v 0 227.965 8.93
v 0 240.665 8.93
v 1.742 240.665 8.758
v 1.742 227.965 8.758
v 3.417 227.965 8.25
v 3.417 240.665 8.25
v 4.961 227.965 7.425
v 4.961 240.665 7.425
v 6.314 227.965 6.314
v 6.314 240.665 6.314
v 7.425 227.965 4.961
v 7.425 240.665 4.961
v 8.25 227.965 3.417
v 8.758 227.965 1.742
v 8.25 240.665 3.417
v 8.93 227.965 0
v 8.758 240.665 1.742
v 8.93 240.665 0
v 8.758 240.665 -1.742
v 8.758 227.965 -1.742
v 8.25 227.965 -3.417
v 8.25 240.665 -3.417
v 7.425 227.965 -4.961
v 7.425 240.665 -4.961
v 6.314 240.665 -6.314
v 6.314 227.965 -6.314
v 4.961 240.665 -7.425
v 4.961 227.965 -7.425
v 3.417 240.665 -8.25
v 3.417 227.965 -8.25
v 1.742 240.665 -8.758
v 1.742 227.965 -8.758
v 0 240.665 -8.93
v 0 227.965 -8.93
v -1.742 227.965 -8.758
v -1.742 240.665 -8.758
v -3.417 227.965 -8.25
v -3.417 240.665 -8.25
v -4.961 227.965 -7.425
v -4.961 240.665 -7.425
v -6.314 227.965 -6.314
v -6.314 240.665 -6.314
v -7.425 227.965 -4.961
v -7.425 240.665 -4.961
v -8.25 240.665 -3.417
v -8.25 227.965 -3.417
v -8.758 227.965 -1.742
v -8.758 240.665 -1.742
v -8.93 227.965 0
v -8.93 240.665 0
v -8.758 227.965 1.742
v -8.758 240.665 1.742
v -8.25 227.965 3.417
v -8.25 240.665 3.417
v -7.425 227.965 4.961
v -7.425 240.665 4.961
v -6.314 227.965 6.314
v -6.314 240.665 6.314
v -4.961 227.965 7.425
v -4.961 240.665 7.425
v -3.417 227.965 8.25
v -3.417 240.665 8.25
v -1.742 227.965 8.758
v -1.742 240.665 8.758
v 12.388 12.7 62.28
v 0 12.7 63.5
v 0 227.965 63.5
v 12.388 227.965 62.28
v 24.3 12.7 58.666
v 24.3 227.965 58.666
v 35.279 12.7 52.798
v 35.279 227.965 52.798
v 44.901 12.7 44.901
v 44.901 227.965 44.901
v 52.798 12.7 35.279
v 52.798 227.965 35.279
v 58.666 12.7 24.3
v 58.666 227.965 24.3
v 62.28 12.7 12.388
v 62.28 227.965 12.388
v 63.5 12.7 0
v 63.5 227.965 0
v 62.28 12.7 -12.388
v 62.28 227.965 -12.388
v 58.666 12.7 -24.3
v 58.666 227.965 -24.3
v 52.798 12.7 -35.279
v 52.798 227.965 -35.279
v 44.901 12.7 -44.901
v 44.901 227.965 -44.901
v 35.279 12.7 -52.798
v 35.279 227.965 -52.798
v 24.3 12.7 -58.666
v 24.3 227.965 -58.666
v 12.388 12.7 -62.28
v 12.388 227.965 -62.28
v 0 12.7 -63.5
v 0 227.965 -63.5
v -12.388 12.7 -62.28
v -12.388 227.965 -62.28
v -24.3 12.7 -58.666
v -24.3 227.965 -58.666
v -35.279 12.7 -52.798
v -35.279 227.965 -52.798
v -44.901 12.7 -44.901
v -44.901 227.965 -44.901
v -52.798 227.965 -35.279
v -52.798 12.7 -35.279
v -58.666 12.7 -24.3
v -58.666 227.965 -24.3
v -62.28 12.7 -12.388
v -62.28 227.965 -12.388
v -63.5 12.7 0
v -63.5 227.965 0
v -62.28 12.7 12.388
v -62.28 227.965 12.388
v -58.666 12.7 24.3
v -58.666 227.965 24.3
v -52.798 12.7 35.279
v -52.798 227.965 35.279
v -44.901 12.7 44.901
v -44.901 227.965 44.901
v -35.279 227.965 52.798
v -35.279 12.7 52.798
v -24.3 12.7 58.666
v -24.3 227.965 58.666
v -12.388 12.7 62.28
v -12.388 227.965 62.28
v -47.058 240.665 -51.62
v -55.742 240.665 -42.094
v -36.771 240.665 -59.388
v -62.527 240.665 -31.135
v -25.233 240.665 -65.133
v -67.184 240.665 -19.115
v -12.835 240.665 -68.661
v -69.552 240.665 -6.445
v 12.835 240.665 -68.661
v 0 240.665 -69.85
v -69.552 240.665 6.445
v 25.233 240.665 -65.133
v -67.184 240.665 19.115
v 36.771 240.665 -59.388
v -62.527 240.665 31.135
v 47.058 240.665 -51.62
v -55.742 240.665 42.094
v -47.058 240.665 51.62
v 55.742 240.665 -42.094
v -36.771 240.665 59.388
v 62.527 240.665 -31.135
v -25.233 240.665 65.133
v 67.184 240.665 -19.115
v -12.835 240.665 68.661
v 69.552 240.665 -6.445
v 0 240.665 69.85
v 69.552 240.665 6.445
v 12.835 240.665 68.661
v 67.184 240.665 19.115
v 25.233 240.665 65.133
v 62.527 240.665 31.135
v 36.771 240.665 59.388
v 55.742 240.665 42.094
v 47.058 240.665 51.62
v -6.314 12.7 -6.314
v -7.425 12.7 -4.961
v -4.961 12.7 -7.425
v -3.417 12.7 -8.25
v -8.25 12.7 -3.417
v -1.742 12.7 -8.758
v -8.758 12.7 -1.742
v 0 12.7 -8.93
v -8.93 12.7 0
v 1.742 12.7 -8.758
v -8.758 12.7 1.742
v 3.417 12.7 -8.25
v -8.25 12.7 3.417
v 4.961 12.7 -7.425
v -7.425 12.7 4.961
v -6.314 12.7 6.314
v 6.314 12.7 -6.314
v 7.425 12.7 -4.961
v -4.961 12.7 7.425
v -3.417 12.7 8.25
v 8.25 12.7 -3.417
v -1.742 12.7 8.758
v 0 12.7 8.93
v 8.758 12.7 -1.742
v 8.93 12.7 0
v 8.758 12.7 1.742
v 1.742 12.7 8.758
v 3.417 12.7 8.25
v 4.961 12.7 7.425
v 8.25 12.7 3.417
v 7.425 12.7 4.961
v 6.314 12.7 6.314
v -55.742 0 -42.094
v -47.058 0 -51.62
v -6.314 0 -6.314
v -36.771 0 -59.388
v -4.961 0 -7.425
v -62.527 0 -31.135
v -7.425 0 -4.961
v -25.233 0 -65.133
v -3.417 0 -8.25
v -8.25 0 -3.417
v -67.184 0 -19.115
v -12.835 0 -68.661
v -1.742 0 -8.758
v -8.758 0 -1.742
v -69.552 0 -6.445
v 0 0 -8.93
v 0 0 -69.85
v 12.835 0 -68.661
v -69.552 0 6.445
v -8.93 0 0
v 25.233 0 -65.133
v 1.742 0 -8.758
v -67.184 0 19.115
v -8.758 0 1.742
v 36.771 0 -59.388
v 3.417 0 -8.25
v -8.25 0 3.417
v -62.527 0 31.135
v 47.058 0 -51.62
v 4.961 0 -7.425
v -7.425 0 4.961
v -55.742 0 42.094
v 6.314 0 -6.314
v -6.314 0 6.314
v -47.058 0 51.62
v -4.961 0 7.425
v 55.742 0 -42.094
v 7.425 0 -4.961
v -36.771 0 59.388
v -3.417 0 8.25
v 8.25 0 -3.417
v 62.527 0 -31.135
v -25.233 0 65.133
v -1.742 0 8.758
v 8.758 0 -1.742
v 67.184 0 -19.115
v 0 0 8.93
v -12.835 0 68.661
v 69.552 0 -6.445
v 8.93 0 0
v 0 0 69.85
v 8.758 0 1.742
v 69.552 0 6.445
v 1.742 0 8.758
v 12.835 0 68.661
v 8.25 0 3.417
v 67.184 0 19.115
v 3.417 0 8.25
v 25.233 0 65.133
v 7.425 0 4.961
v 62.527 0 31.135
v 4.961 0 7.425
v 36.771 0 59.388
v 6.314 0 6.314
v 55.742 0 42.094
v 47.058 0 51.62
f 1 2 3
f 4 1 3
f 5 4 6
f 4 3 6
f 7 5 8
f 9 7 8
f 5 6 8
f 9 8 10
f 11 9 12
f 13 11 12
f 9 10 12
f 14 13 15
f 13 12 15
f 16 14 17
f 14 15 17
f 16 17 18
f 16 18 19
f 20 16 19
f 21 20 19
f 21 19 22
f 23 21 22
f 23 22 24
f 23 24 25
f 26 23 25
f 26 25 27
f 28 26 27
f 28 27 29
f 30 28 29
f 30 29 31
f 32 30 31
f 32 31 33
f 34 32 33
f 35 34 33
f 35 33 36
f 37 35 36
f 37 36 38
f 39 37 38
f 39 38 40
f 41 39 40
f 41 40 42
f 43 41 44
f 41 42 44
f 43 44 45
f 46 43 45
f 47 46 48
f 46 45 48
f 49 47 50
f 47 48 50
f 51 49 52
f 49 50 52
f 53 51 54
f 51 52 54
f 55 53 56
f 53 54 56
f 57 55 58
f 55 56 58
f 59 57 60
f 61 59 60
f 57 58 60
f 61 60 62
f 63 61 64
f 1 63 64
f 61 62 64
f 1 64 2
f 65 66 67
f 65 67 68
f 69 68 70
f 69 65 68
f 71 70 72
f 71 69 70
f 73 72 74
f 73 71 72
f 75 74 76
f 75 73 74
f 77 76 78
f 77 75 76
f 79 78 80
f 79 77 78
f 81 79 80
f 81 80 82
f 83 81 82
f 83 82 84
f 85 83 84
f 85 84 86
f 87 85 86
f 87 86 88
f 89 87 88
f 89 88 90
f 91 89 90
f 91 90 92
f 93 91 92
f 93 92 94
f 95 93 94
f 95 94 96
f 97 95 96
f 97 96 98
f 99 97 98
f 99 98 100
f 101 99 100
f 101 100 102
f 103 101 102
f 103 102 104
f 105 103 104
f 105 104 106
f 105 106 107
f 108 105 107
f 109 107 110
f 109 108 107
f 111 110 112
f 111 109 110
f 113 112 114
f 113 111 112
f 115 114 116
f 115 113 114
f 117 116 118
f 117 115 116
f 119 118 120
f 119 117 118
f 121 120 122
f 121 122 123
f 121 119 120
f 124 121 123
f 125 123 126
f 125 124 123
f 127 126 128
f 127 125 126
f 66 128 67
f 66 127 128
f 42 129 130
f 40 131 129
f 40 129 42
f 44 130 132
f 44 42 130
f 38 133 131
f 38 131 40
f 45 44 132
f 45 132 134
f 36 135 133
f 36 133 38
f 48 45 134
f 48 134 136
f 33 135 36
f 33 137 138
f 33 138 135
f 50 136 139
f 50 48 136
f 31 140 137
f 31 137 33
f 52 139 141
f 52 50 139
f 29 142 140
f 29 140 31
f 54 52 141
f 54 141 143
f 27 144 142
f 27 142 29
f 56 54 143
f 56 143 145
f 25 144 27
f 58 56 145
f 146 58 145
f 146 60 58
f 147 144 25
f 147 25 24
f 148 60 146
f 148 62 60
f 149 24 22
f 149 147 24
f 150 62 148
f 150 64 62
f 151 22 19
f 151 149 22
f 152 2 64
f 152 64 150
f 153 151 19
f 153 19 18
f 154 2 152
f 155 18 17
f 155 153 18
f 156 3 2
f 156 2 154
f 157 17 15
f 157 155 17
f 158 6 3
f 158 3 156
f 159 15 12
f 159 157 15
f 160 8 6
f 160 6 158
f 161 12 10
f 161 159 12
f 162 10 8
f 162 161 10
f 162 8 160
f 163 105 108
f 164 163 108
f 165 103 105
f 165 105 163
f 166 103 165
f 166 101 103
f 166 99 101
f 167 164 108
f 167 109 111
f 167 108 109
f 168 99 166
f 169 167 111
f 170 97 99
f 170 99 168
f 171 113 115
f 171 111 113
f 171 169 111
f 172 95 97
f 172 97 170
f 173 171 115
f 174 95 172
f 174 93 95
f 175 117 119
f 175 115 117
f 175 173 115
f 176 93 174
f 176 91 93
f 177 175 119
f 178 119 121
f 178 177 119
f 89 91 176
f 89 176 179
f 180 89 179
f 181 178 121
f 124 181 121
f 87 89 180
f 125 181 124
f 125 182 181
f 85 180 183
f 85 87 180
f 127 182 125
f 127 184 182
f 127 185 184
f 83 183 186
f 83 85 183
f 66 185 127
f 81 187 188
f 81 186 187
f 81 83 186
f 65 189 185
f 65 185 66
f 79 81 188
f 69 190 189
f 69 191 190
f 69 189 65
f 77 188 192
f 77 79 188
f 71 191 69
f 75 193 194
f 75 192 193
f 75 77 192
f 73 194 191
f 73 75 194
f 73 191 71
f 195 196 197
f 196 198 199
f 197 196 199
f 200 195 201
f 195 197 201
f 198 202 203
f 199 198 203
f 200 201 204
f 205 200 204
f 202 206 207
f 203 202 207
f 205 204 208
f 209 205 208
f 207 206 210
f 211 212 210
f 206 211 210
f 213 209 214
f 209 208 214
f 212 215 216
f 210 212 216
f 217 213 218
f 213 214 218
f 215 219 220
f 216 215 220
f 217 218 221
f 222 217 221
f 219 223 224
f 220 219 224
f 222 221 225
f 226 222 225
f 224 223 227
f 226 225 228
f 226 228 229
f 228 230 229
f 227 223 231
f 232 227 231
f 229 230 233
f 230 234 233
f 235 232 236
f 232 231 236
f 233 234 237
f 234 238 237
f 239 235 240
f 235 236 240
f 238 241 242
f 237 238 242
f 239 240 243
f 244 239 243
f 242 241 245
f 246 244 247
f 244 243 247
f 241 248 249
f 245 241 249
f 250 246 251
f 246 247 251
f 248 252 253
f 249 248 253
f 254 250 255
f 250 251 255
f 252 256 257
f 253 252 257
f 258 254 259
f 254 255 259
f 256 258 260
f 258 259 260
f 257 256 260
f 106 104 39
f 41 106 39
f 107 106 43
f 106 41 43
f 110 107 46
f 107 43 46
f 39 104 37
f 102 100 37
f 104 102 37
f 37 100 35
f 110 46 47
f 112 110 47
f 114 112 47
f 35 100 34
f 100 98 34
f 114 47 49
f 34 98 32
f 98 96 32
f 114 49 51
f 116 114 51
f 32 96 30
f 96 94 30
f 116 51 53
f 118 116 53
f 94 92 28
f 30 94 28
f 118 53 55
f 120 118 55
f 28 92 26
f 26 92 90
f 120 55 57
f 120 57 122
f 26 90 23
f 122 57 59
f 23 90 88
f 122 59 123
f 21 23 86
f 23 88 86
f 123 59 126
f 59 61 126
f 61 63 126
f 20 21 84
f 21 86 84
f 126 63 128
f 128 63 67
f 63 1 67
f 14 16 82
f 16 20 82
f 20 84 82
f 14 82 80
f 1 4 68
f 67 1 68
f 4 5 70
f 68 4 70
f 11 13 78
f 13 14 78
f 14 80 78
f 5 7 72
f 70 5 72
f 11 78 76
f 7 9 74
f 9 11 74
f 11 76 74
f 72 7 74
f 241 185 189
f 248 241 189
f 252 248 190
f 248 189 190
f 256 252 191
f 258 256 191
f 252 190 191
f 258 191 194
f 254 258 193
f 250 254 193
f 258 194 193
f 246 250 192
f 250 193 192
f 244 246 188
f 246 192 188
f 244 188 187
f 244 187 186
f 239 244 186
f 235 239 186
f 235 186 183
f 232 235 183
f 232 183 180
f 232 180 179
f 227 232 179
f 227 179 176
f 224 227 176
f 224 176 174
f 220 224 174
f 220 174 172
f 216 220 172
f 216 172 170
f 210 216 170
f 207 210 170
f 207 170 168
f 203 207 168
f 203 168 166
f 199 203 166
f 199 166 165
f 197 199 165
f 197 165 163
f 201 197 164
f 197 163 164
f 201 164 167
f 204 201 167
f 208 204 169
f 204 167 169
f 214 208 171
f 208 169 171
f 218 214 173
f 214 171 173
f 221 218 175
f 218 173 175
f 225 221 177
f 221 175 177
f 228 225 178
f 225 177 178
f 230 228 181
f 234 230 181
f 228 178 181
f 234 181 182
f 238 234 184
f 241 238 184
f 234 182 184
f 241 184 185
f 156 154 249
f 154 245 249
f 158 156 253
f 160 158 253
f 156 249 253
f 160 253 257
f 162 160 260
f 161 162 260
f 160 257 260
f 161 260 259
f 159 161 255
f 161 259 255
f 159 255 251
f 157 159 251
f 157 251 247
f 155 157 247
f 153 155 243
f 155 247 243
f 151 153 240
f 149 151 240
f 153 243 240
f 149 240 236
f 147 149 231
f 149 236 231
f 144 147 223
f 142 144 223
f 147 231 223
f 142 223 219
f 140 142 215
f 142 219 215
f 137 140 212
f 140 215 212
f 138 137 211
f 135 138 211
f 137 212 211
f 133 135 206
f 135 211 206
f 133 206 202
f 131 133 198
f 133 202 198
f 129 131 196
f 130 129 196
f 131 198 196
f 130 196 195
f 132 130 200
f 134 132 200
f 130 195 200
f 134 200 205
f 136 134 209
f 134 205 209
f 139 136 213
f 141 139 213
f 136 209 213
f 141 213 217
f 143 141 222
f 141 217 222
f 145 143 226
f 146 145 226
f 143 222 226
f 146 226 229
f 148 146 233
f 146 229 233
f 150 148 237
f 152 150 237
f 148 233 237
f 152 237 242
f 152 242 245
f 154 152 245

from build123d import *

# Parameters (mm, degrees)
SKETCH1_R           = 69.85
BOSS_EXTRUDE1_DEPTH = 12.7
SKETCH1_3_R         = 69.85
SKETCH1_3_R_2       = 63.5
BOSS_EXTRUDE2_DEPTH = 227.965
SKETCH2_R           = 69.85
BOSS_EXTRUDE3_DEPTH = 12.7
SKETCH3_R           = 8.9296875
CUT_EXTRUDE1_DEPTH  = 335.534


with BuildPart() as part:
    # Sketch1 → Boss-Extrude1 (new body)
    with BuildSketch(Plane(origin=(0, 0, 0), x_dir=(1, 0, 0), z_dir=(0, 1, 0))):
        Circle(SKETCH1_R)
    extrude(amount=BOSS_EXTRUDE1_DEPTH)

    # Sketch1<3> → Boss-Extrude2 (add)
    with BuildSketch(Plane(origin=(0, 0, 0), x_dir=(1, 0, 0), z_dir=(0, 1, 0))):
        Circle(SKETCH1_3_R)
        Circle(SKETCH1_3_R_2, mode=Mode.SUBTRACT)
    extrude(amount=BOSS_EXTRUDE2_DEPTH)

    # Sketch2 → Boss-Extrude3 (add)
    with BuildSketch(Plane(origin=(0, 227.965, 0), x_dir=(1, 0, 0), z_dir=(0, 1, 0))):
        Circle(SKETCH2_R)
    extrude(amount=BOSS_EXTRUDE3_DEPTH)

    # Sketch3 → Cut-Extrude1 (cut)
    with BuildSketch(Plane(origin=(0, 240.665, 0), x_dir=(1, 0, 0), z_dir=(0, 1, 0))):
        Circle(SKETCH3_R)
    extrude(amount=-CUT_EXTRUDE1_DEPTH, mode=Mode.SUBTRACT)


solid = part.part
